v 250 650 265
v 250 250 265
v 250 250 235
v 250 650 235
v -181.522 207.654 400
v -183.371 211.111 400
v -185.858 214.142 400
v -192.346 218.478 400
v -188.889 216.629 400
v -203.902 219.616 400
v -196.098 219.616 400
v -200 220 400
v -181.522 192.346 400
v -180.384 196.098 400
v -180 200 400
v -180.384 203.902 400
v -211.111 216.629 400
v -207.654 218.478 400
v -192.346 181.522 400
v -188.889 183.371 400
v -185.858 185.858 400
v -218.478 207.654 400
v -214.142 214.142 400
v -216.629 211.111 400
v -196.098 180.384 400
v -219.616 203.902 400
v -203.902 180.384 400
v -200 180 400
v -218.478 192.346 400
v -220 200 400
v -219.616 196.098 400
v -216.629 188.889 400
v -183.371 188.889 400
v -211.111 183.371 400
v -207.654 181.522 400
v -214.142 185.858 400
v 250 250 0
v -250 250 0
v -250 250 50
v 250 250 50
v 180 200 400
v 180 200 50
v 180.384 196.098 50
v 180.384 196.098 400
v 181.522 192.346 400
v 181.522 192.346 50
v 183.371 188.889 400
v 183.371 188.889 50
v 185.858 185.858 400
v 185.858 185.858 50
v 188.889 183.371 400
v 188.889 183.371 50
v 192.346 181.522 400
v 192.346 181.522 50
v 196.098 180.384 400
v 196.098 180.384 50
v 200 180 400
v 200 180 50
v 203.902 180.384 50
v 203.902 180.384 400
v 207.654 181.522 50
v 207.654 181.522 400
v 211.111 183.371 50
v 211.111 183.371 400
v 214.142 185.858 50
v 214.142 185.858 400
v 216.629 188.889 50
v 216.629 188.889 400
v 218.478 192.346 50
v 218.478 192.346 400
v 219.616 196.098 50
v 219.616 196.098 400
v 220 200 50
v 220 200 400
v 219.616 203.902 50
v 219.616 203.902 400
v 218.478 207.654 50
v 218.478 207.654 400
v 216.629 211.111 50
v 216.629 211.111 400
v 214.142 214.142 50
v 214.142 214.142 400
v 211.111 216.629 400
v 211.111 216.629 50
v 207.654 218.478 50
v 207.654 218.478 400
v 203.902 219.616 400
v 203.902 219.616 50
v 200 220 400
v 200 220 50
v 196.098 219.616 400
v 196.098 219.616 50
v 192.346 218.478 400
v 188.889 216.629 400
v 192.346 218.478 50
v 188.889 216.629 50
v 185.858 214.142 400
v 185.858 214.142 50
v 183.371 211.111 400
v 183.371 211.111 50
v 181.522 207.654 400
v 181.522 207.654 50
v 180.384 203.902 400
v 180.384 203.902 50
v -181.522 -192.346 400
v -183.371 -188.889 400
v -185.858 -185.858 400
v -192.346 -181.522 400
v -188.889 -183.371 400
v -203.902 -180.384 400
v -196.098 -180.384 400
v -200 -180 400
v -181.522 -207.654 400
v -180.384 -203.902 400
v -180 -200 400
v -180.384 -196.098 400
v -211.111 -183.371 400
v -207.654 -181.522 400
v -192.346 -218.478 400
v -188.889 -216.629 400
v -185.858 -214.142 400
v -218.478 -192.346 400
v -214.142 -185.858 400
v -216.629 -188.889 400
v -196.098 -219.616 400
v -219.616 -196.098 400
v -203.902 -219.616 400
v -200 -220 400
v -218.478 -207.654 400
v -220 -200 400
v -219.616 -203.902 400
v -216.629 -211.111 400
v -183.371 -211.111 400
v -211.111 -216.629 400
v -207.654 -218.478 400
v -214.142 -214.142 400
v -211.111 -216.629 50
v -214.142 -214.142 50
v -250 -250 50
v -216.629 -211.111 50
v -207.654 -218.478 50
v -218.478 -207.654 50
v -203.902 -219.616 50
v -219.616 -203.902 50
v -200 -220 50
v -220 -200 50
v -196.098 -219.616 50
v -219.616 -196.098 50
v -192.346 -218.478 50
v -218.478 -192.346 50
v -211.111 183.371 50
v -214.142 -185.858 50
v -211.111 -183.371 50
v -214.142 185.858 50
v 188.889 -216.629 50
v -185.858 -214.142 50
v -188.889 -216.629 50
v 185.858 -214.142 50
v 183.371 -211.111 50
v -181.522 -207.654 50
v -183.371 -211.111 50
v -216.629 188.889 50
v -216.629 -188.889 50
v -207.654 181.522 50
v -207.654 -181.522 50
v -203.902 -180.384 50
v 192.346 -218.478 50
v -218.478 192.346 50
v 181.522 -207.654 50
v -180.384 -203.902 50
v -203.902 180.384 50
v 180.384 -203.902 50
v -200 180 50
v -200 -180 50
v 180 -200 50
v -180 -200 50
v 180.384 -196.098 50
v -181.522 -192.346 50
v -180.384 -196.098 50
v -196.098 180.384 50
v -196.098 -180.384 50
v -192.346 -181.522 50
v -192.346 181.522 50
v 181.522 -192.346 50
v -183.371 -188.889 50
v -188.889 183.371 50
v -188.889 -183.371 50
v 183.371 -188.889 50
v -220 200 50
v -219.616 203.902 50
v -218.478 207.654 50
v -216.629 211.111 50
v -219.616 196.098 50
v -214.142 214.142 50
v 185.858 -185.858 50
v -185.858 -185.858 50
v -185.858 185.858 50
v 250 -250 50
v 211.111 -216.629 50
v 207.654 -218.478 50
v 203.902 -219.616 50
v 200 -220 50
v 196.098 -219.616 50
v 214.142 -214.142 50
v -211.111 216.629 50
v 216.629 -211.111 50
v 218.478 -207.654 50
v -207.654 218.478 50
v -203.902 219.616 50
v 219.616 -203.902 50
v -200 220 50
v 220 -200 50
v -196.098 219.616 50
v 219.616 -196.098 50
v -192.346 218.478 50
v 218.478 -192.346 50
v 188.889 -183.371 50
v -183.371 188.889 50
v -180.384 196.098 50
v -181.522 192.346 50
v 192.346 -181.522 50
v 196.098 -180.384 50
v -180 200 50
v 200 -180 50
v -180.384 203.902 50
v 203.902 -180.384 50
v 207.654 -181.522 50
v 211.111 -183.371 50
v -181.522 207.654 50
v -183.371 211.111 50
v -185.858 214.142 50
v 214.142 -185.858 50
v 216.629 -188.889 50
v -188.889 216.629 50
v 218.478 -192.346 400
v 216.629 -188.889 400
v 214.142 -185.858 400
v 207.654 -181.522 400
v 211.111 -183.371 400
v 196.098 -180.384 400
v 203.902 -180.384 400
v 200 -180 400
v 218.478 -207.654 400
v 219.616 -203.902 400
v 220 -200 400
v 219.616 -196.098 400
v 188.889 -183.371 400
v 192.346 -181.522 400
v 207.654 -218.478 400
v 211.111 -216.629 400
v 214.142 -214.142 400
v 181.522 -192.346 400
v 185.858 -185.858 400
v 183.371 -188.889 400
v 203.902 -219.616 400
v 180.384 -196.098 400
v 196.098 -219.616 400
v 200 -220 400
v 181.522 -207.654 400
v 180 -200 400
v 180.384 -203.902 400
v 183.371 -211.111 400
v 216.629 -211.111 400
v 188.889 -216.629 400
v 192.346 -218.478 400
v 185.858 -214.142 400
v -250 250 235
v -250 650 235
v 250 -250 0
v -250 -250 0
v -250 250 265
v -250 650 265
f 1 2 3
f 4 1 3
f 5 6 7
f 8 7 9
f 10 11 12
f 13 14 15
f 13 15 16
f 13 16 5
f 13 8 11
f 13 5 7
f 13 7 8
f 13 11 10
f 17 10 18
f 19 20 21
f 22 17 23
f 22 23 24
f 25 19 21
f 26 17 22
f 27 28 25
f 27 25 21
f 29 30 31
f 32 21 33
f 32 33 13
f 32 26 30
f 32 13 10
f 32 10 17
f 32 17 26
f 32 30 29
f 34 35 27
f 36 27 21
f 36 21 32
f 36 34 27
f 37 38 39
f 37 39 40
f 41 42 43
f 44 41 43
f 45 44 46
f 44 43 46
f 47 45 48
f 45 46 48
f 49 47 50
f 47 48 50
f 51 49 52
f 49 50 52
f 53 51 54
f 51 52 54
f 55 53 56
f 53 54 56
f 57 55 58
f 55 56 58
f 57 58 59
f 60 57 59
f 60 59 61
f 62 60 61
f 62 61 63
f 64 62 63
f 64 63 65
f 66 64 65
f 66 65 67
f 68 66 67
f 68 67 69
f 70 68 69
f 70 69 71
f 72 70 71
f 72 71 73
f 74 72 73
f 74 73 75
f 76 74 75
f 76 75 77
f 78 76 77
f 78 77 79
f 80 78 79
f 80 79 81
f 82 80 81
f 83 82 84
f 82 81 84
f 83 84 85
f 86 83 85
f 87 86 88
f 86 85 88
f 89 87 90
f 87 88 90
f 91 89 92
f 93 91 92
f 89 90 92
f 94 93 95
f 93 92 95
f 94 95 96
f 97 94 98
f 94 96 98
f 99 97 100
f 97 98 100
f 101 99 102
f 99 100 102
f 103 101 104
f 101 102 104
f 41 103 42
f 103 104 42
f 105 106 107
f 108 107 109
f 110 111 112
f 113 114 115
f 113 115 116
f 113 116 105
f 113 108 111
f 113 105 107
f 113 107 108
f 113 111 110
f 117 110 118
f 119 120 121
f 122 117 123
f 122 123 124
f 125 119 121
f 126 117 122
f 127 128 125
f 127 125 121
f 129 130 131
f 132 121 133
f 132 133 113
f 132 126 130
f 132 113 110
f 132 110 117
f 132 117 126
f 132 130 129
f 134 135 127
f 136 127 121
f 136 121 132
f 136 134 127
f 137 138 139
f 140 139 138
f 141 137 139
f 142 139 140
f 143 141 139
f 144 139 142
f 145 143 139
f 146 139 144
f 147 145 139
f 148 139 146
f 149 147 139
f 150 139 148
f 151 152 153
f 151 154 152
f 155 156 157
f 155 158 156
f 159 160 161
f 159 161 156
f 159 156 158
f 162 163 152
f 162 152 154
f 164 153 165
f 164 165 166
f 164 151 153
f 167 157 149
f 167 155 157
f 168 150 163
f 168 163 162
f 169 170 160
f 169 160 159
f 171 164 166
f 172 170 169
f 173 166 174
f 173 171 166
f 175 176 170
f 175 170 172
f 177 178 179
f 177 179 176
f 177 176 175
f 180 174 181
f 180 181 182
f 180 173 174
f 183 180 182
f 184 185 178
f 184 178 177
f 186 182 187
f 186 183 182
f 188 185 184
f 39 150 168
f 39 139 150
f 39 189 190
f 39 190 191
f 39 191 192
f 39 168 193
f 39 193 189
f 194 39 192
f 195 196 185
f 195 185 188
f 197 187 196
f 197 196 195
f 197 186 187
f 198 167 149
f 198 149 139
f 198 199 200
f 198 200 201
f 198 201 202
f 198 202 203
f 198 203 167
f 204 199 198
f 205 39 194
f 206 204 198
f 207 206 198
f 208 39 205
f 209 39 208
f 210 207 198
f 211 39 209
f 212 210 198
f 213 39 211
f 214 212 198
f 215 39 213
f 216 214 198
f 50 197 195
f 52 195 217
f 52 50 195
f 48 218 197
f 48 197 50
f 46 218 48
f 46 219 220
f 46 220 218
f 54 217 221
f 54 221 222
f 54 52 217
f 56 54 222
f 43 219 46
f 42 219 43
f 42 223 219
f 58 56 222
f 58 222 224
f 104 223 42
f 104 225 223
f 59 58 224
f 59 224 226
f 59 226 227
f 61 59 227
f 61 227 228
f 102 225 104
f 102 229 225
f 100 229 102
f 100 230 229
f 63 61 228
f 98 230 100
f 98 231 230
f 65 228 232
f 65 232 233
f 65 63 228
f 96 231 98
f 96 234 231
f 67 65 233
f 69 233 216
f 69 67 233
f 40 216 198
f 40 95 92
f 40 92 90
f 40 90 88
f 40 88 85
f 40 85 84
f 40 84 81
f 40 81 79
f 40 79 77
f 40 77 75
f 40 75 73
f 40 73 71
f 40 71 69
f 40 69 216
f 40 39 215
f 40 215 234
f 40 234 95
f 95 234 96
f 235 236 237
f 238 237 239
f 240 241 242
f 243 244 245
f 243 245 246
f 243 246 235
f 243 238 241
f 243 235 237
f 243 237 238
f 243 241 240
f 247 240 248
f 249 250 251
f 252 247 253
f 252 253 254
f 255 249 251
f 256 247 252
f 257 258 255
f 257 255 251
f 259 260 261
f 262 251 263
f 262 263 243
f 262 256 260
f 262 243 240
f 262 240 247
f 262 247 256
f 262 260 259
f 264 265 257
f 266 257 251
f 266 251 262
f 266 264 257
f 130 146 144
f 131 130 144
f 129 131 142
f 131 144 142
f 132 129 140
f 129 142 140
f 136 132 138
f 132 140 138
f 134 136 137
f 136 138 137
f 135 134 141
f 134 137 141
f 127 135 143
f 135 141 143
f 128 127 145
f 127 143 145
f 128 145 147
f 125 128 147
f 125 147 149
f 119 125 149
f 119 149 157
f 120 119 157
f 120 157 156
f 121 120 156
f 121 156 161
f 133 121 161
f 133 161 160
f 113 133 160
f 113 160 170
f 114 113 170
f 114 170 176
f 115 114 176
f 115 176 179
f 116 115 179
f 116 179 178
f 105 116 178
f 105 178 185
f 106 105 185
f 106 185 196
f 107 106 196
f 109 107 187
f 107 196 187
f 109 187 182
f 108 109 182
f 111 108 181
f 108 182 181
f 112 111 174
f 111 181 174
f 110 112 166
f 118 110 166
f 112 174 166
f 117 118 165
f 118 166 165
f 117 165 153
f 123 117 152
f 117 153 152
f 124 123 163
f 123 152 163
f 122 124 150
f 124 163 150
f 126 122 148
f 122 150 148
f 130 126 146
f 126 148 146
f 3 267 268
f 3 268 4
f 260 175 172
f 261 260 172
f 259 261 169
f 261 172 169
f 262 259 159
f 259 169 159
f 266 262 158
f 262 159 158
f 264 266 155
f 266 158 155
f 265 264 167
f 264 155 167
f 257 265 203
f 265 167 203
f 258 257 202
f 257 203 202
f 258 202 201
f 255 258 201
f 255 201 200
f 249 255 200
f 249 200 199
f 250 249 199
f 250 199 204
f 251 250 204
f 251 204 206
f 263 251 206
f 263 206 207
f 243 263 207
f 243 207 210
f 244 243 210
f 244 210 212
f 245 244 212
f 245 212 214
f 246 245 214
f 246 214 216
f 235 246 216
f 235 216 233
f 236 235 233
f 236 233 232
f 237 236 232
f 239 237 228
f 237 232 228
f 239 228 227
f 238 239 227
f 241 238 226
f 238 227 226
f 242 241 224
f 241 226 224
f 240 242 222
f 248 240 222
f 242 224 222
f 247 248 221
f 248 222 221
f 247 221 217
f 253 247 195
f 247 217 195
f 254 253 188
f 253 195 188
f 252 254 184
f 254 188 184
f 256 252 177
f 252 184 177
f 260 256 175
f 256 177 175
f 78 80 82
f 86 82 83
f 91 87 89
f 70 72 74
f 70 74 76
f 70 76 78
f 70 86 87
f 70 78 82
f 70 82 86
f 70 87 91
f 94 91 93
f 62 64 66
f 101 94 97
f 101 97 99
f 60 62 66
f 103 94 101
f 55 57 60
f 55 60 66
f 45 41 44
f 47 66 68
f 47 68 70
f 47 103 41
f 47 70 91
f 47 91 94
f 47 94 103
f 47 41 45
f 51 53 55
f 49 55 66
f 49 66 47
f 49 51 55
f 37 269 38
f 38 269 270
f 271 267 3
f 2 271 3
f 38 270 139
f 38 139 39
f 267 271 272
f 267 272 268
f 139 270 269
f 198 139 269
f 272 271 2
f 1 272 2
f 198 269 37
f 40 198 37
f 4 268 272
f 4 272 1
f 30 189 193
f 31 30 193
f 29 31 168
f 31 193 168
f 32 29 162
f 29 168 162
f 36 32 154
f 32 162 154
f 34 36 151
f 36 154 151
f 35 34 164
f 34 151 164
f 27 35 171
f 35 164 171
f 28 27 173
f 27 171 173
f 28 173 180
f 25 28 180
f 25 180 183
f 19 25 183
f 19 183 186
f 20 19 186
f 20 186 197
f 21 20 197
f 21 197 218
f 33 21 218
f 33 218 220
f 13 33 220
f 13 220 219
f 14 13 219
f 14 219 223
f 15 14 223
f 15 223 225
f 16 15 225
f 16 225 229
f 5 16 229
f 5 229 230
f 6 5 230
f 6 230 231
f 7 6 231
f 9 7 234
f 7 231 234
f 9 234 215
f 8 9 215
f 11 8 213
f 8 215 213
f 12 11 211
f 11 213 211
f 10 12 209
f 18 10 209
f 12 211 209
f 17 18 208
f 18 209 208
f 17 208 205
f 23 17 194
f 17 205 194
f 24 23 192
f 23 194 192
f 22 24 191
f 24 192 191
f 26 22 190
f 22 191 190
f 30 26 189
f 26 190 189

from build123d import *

# Parameters (mm, degrees)
SKETCH_1_W      = 500
SKETCH_1_H      = 500
EXTRUDE_1_DEPTH = 50
SKETCH_2_R      = 20
EXTRUDE_2_DEPTH = 400
SKETCH_3_R      = 20
EXTRUDE_3_DEPTH = 400
SKETCH_4_R      = 20
EXTRUDE_4_DEPTH = 400
SKETCH_5_R      = 20
EXTRUDE_5_DEPTH = 400
SKETCH_6_W      = 500
SKETCH_6_H      = 30
EXTRUDE_6_DEPTH = 400


with BuildPart() as part:
    # 草图1 → 凸台-拉伸1 (new body)
    with BuildSketch(Plane.XY):
        Rectangle(SKETCH_1_W, SKETCH_1_H)
    extrude(amount=EXTRUDE_1_DEPTH)

    # 草图2 → 凸台-拉伸2 (add)
    with BuildSketch(Plane.XY):
        with Locations(Location((-200, -200, 0), (0, 0, 180))):
            Circle(SKETCH_2_R)
    extrude(amount=EXTRUDE_2_DEPTH)

    # 草图3 → 凸台-拉伸3 (add)
    with BuildSketch(Plane.XY):
        with Locations(Location((200, -200, 0), (0, 0, 180))):
            Circle(SKETCH_3_R)
    extrude(amount=EXTRUDE_3_DEPTH)

    # 草图4 → 凸台-拉伸4 (add)
    with BuildSketch(Plane.XY):
        with Locations(Location((-200, 200, 0), (0, 0, 180))):
            Circle(SKETCH_4_R)
    extrude(amount=EXTRUDE_4_DEPTH)

    # 草图5 → 凸台-拉伸5 (add)
    with BuildSketch(Plane.XY):
        with Locations(Location((200, 200, 0), (0, 0, 180))):
            Circle(SKETCH_5_R)
    extrude(amount=EXTRUDE_5_DEPTH)


with BuildPart() as body_2:
    # 草图6 → 凸台-拉伸6 (new body)
    with BuildSketch(Plane(origin=(0, 250, 0), x_dir=(1, 0, 0), z_dir=(0, 1, 0))):
        with Locations((0, -250)):
            Rectangle(SKETCH_6_W, SKETCH_6_H)
    extrude(amount=EXTRUDE_6_DEPTH)


solid = Compound([part.part, body_2.part])
